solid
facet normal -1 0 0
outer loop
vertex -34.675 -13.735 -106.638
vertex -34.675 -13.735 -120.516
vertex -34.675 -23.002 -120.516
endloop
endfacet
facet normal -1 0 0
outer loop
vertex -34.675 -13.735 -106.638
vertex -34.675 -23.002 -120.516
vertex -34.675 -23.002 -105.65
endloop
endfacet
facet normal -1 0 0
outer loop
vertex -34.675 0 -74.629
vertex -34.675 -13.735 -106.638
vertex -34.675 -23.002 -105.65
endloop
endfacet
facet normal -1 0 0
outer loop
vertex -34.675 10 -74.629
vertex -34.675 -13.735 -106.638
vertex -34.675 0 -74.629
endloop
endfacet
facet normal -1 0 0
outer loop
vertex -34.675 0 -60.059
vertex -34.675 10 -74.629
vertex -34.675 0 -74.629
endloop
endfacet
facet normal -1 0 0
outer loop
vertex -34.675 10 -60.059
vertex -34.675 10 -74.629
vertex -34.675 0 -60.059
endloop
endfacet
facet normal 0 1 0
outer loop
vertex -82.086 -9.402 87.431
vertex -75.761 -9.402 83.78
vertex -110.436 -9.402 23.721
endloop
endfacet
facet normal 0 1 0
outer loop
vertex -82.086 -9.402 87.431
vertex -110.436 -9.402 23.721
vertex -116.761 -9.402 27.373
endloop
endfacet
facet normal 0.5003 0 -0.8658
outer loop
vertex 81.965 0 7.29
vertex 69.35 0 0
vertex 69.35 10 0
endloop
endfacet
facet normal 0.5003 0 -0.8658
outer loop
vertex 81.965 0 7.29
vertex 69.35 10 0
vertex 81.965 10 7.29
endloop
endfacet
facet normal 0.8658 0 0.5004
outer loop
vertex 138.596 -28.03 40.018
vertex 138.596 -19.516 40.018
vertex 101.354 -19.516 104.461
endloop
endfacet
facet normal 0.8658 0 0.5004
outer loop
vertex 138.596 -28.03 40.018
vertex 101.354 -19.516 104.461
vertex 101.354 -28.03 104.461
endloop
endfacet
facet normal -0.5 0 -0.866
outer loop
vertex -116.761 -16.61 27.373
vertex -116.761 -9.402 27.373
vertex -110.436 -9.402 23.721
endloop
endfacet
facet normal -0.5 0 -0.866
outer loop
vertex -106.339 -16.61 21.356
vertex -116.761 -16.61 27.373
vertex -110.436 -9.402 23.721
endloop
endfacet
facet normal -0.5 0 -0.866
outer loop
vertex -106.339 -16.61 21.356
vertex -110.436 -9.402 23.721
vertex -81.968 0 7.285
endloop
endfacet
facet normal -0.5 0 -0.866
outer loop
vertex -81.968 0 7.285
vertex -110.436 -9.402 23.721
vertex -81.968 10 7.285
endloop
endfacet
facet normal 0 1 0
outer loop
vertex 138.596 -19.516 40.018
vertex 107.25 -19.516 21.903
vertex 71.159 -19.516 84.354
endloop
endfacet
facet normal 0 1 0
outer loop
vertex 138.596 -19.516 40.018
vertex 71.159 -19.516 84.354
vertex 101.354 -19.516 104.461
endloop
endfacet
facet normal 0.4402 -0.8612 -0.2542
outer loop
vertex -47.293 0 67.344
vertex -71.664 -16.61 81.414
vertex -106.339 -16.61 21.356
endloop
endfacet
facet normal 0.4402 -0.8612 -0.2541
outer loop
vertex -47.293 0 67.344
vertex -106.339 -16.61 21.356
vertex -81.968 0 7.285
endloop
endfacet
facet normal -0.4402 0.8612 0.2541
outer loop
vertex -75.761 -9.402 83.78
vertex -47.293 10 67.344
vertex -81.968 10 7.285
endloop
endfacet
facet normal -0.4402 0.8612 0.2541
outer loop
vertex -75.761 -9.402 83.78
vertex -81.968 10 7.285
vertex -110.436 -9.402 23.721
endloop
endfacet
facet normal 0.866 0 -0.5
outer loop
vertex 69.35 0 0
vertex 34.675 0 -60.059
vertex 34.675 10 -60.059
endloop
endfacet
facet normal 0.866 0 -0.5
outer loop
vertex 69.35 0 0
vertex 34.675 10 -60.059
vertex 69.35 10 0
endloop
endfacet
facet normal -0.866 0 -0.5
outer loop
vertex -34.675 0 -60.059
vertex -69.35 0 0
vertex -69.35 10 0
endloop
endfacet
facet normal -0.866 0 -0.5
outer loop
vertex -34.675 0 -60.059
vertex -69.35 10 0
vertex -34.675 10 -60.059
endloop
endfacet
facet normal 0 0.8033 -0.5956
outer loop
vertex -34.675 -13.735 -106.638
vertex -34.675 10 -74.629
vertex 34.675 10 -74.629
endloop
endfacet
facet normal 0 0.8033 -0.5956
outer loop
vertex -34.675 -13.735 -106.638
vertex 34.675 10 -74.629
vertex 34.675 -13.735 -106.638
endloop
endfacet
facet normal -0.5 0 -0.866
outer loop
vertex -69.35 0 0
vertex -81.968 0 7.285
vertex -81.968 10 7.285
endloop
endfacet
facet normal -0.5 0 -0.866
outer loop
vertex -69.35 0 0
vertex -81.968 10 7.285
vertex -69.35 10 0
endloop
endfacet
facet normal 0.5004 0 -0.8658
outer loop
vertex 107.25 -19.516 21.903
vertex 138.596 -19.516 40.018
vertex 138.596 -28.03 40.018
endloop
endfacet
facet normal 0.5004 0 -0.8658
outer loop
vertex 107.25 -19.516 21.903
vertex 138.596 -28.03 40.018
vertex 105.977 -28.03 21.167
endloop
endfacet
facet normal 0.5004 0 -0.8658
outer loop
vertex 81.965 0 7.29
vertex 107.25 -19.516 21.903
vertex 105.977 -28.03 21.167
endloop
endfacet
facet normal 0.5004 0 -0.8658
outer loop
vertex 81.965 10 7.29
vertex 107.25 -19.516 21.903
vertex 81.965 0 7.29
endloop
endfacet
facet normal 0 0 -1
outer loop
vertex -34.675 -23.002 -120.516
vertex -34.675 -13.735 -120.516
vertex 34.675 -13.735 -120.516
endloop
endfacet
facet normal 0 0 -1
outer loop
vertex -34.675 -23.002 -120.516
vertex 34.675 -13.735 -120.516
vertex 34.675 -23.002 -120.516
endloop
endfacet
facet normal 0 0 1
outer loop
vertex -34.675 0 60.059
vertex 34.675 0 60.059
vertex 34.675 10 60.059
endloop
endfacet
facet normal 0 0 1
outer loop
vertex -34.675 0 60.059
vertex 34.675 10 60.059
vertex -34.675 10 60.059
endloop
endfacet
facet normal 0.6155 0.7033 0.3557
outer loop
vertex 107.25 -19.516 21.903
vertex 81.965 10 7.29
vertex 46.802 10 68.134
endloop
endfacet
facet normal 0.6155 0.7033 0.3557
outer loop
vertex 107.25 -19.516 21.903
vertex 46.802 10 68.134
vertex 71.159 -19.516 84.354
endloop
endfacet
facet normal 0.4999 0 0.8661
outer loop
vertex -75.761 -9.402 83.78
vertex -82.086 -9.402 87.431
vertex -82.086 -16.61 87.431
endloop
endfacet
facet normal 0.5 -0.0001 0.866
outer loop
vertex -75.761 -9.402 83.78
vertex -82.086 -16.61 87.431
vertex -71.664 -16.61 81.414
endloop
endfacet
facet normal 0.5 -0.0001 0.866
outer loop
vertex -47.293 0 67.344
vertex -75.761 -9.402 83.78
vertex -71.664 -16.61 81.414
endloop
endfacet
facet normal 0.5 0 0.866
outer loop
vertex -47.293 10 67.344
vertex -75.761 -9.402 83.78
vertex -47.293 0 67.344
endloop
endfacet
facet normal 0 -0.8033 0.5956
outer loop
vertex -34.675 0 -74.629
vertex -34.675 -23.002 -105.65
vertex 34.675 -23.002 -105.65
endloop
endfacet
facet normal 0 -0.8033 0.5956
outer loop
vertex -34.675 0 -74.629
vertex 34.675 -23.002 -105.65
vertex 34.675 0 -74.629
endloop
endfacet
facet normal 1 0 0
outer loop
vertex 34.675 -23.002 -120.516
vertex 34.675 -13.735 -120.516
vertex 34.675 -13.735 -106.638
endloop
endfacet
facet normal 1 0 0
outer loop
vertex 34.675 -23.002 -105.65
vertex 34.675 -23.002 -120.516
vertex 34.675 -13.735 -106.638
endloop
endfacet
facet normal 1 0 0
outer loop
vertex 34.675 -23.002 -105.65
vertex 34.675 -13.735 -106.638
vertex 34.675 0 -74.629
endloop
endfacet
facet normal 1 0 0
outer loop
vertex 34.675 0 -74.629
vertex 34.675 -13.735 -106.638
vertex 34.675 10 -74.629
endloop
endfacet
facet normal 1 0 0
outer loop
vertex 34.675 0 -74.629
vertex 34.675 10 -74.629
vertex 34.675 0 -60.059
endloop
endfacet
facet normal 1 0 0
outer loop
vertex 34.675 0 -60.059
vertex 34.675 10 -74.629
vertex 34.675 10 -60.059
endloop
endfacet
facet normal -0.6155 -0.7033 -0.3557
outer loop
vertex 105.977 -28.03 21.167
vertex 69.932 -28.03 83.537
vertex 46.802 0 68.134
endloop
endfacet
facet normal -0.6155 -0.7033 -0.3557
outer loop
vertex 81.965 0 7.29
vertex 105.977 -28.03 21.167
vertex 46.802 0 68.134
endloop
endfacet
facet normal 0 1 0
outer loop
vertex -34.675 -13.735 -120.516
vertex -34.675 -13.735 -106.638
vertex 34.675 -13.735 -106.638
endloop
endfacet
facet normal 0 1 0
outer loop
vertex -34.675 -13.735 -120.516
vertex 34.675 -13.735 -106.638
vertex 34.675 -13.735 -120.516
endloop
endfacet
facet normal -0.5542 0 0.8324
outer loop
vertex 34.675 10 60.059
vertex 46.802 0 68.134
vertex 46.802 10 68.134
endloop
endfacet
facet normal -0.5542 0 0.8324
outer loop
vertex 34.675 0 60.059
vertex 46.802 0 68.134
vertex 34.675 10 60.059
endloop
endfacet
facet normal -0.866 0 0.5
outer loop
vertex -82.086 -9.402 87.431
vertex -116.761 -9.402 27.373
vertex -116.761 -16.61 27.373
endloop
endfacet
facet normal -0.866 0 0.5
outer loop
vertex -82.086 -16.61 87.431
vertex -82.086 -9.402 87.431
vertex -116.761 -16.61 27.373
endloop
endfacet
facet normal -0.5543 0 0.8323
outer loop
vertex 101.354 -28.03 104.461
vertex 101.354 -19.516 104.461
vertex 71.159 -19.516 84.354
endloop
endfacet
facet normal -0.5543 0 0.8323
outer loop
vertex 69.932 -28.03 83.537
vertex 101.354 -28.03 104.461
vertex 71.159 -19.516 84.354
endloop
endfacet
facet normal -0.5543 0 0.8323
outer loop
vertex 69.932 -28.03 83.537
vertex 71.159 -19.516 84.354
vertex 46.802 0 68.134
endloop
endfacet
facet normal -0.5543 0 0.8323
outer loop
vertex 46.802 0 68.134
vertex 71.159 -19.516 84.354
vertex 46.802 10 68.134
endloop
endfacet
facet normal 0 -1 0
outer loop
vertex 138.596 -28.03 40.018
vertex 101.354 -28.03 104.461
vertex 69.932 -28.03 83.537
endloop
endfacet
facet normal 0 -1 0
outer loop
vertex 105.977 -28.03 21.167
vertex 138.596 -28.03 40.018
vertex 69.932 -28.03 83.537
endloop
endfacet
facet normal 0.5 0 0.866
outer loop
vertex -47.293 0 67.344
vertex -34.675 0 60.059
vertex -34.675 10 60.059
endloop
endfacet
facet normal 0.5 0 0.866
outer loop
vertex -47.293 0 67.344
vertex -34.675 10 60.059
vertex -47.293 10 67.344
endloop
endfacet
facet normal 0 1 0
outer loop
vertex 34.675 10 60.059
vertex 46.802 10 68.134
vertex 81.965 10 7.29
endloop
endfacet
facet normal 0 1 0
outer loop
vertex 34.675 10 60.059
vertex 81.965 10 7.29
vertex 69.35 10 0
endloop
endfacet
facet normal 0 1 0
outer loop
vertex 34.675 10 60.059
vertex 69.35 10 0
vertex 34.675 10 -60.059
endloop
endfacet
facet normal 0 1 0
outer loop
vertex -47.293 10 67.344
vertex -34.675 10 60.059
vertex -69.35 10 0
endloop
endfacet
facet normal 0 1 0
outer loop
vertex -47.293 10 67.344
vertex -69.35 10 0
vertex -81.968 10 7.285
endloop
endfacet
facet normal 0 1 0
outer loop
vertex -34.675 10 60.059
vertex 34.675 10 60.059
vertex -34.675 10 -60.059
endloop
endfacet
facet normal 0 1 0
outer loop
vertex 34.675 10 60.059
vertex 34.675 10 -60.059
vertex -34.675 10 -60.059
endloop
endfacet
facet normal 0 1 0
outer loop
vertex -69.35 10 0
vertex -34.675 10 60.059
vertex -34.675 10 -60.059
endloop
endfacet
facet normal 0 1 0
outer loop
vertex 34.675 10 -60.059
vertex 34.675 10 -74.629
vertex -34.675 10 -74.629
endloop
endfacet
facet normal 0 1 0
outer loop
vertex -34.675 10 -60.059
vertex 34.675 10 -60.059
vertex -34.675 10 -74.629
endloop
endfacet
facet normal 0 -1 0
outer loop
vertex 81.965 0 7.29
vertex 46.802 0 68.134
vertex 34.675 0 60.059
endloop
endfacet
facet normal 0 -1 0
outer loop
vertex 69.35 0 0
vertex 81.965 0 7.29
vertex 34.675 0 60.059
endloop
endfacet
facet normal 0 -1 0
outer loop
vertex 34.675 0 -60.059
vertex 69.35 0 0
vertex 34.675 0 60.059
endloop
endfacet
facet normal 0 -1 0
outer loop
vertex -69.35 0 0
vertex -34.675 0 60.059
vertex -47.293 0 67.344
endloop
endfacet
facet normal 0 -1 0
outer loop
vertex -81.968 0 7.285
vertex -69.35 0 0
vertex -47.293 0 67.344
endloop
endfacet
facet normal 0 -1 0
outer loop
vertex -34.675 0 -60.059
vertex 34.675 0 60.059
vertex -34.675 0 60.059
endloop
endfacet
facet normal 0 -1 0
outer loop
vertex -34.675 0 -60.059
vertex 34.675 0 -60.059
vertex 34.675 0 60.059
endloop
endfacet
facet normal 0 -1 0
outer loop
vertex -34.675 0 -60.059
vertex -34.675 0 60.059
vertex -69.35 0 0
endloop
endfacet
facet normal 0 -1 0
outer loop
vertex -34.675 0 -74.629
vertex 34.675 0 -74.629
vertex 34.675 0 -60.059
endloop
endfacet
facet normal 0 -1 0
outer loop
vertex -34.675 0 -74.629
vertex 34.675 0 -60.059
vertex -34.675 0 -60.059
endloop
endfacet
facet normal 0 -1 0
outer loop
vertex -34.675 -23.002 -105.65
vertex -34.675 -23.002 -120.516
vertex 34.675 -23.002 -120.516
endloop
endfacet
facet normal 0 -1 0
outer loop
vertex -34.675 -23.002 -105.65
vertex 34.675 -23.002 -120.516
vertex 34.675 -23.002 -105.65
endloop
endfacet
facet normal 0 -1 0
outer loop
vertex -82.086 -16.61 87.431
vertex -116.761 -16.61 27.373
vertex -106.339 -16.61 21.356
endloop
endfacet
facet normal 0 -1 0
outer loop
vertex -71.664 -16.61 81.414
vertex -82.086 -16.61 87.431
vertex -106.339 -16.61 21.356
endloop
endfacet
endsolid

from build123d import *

# Parameters (mm, degrees)
BOSS_EXTRUDE1_DEPTH = 10
BOSS_EXTRUDE3_DEPTH = 69.34963783
BOSS_EXTRUDE4_DEPTH = 69.34963783
BOSS_EXTRUDE5_REACH = 181.774


with BuildPart() as part:
    # Sketch2 → Boss-Extrude1 (new body)
    with BuildSketch(Plane(origin=(0, 0, 0), x_dir=(1, 0, 0), z_dir=(0, 1, 0))):
        Polygon((-34.674818915, 60.058548104), (-34.674818915, 74.628755779), (34.674818915, 74.628755779), (34.674818915, 60.058548104), (69.34963783, 0), (81.964725461, -7.290440025), (46.802147984, -68.134366411), (34.674818915, -60.058548104), (-34.674818915, -60.058548104), (-47.2929889, -67.343651941), (-81.967807815, -7.285103837), (-69.34963783, 0), align=None)
    extrude(amount=BOSS_EXTRUDE1_DEPTH)

    # Sketch5 → Boss-Extrude3 (add)
    with BuildSketch(Plane(origin=(17.337409458, 0, 30.029274052), x_dir=(0.8660254037844373, 0, -0.5000000000000024), z_dir=(0.5000000000000024, 0, 0.8660254037844373))):
        Polygon((-74.628755779, 10), (-107.500686605, -9.402116298), (-114.804327341, -9.402116298), (-114.804327341, -16.610041857), (-102.770229552, -16.610041857), (-74.628755779, 0), align=None)
    extrude(amount=-BOSS_EXTRUDE3_DEPTH)

    # Sketch7 → Boss-Extrude4 (add)
    with BuildSketch(Plane.ZY.offset(34.674818915)):
        Polygon((-74.628755779, 10), (-106.637571533, -13.734668021), (-120.515633105, -13.734668021), (-120.515633105, -23.002237989), (-105.649808909, -23.002237989), (-74.628755779, 0), align=None)
    extrude(amount=-BOSS_EXTRUDE4_DEPTH)

    # Boss-Extrude5: up to this plane
    boss_extrude5_end = Plane(origin=(46.802147984, 10, 68.134366411), z_dir=(0.5542692655665835, 0, -0.8323374203099847))
    # Sketch8 → Boss-Extrude5 (add, up to the surface)
    with BuildSketch(Plane(origin=(17.362817345, 0, -30.043928978), x_dir=(-0.8658138519612032, 0, -0.500366239620644), z_dir=(0.500366239620644, 0, -0.8658138519612032)), mode=Mode.PRIVATE) as boss_extrude5_sk1:
        Polygon((-74.614084737, 10), (-103.818325668, -19.516175566), (-140.022146245, -19.516175566), (-140.022146245, -28.029543005), (-102.347404227, -28.029543005), (-74.614084737, 0), align=None)
    boss_extrude5_tool1 = split(extrude(boss_extrude5_sk1.sketch, amount=-BOSS_EXTRUDE5_REACH, mode=Mode.PRIVATE), bisect_by=boss_extrude5_end, keep=Keep.BOTH, mode=Mode.PRIVATE)
    add(boss_extrude5_tool1.solids().sort_by_distance((94.141781, -5.290236, 14.327735))[0])


solid = part.part
